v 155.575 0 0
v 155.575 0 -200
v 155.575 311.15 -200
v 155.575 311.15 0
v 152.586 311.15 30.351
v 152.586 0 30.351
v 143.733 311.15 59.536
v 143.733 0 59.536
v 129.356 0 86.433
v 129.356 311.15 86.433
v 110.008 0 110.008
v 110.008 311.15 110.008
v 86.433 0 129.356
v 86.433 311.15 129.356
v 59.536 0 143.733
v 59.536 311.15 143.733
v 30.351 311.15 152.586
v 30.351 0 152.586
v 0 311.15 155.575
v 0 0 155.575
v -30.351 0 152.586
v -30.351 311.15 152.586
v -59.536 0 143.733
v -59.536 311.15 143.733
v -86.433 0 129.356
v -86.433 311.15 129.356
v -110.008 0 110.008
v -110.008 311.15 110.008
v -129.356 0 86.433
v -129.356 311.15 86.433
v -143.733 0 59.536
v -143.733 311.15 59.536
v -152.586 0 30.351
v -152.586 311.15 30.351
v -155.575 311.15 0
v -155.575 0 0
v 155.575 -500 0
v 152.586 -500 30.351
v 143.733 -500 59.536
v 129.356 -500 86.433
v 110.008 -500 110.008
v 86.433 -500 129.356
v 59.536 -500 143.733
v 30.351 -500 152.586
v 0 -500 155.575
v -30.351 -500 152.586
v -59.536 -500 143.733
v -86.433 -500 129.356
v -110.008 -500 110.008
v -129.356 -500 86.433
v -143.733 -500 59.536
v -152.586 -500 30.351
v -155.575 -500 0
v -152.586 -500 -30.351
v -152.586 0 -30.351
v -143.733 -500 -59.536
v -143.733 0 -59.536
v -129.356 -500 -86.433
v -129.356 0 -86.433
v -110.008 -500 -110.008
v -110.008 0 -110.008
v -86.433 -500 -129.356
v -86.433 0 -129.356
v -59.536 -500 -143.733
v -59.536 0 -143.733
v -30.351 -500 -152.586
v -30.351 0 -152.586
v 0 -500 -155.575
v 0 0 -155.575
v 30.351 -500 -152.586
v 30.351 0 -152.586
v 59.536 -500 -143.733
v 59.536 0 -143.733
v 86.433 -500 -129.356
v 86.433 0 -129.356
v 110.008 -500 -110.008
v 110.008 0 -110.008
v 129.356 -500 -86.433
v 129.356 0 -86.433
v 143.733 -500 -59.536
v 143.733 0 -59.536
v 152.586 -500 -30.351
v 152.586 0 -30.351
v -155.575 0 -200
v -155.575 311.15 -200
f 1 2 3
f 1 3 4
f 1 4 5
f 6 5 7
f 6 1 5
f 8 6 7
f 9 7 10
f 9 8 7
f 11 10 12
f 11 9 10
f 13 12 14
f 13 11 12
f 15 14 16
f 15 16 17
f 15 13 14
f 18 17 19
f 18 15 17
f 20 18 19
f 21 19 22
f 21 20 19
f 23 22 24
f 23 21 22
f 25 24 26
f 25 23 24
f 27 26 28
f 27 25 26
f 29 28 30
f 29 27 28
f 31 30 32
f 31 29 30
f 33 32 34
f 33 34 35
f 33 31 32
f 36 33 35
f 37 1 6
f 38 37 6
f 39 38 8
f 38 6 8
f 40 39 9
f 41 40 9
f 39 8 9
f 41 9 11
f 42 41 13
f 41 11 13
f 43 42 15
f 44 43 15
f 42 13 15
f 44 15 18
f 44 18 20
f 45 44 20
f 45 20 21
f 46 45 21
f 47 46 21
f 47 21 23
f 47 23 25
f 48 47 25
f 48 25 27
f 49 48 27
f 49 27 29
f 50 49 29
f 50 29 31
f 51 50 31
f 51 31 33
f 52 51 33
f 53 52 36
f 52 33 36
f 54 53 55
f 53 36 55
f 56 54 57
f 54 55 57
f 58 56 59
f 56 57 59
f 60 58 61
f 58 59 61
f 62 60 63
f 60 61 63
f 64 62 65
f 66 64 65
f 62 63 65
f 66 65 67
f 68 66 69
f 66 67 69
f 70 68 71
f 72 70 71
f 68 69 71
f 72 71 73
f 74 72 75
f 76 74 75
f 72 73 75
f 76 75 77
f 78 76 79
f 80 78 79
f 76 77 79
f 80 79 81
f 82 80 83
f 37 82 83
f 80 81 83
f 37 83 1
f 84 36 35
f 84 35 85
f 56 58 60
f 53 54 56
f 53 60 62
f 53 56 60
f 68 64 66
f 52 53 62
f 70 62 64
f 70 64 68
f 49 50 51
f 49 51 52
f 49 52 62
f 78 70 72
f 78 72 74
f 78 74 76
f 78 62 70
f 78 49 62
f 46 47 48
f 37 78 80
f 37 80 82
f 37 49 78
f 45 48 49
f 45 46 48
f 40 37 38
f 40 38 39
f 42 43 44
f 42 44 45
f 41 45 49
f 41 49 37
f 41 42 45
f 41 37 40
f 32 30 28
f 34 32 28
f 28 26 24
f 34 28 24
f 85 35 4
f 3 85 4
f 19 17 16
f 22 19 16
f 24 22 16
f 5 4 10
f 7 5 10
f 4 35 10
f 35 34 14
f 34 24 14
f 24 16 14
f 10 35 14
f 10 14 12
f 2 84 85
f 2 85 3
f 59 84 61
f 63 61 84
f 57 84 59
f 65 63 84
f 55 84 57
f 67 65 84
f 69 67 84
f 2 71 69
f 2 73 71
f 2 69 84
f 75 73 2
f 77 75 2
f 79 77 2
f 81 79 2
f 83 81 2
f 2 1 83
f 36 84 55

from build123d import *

# Parameters (mm, degrees)
F1_DEPTH = 500
F2_DEPTH = 311.15


with BuildPart() as f1:
    # F0 (on Front) → F1 (new body)
    with BuildSketch(Plane.XZ):
        with BuildLine():
            ThreePointArc((-155.575, 0), (0, -155.575), (155.575, 0))
            ThreePointArc((155.575, 0), (0, 155.575), (-155.575, 0))
        make_face()
    extrude(amount=F1_DEPTH)

    # F0 (on Front) → F2 (join)
    with BuildSketch(Plane.XZ):
        with BuildLine():
            ThreePointArc((-155.575, 0), (0, -155.575), (155.575, 0))
            ThreePointArc((155.575, 0), (0, 155.575), (-155.575, 0))
        make_face()
        with BuildLine():
            Line((155.575, -200), (155.575, 0))
            ThreePointArc((155.575, 0), (0, -155.575), (-155.575, 0))
            Line((-155.575, 0), (-155.575, -200))
            Line((-155.575, -200), (155.575, -200))
        make_face()
    extrude(amount=-F2_DEPTH)


solid = f1.part
